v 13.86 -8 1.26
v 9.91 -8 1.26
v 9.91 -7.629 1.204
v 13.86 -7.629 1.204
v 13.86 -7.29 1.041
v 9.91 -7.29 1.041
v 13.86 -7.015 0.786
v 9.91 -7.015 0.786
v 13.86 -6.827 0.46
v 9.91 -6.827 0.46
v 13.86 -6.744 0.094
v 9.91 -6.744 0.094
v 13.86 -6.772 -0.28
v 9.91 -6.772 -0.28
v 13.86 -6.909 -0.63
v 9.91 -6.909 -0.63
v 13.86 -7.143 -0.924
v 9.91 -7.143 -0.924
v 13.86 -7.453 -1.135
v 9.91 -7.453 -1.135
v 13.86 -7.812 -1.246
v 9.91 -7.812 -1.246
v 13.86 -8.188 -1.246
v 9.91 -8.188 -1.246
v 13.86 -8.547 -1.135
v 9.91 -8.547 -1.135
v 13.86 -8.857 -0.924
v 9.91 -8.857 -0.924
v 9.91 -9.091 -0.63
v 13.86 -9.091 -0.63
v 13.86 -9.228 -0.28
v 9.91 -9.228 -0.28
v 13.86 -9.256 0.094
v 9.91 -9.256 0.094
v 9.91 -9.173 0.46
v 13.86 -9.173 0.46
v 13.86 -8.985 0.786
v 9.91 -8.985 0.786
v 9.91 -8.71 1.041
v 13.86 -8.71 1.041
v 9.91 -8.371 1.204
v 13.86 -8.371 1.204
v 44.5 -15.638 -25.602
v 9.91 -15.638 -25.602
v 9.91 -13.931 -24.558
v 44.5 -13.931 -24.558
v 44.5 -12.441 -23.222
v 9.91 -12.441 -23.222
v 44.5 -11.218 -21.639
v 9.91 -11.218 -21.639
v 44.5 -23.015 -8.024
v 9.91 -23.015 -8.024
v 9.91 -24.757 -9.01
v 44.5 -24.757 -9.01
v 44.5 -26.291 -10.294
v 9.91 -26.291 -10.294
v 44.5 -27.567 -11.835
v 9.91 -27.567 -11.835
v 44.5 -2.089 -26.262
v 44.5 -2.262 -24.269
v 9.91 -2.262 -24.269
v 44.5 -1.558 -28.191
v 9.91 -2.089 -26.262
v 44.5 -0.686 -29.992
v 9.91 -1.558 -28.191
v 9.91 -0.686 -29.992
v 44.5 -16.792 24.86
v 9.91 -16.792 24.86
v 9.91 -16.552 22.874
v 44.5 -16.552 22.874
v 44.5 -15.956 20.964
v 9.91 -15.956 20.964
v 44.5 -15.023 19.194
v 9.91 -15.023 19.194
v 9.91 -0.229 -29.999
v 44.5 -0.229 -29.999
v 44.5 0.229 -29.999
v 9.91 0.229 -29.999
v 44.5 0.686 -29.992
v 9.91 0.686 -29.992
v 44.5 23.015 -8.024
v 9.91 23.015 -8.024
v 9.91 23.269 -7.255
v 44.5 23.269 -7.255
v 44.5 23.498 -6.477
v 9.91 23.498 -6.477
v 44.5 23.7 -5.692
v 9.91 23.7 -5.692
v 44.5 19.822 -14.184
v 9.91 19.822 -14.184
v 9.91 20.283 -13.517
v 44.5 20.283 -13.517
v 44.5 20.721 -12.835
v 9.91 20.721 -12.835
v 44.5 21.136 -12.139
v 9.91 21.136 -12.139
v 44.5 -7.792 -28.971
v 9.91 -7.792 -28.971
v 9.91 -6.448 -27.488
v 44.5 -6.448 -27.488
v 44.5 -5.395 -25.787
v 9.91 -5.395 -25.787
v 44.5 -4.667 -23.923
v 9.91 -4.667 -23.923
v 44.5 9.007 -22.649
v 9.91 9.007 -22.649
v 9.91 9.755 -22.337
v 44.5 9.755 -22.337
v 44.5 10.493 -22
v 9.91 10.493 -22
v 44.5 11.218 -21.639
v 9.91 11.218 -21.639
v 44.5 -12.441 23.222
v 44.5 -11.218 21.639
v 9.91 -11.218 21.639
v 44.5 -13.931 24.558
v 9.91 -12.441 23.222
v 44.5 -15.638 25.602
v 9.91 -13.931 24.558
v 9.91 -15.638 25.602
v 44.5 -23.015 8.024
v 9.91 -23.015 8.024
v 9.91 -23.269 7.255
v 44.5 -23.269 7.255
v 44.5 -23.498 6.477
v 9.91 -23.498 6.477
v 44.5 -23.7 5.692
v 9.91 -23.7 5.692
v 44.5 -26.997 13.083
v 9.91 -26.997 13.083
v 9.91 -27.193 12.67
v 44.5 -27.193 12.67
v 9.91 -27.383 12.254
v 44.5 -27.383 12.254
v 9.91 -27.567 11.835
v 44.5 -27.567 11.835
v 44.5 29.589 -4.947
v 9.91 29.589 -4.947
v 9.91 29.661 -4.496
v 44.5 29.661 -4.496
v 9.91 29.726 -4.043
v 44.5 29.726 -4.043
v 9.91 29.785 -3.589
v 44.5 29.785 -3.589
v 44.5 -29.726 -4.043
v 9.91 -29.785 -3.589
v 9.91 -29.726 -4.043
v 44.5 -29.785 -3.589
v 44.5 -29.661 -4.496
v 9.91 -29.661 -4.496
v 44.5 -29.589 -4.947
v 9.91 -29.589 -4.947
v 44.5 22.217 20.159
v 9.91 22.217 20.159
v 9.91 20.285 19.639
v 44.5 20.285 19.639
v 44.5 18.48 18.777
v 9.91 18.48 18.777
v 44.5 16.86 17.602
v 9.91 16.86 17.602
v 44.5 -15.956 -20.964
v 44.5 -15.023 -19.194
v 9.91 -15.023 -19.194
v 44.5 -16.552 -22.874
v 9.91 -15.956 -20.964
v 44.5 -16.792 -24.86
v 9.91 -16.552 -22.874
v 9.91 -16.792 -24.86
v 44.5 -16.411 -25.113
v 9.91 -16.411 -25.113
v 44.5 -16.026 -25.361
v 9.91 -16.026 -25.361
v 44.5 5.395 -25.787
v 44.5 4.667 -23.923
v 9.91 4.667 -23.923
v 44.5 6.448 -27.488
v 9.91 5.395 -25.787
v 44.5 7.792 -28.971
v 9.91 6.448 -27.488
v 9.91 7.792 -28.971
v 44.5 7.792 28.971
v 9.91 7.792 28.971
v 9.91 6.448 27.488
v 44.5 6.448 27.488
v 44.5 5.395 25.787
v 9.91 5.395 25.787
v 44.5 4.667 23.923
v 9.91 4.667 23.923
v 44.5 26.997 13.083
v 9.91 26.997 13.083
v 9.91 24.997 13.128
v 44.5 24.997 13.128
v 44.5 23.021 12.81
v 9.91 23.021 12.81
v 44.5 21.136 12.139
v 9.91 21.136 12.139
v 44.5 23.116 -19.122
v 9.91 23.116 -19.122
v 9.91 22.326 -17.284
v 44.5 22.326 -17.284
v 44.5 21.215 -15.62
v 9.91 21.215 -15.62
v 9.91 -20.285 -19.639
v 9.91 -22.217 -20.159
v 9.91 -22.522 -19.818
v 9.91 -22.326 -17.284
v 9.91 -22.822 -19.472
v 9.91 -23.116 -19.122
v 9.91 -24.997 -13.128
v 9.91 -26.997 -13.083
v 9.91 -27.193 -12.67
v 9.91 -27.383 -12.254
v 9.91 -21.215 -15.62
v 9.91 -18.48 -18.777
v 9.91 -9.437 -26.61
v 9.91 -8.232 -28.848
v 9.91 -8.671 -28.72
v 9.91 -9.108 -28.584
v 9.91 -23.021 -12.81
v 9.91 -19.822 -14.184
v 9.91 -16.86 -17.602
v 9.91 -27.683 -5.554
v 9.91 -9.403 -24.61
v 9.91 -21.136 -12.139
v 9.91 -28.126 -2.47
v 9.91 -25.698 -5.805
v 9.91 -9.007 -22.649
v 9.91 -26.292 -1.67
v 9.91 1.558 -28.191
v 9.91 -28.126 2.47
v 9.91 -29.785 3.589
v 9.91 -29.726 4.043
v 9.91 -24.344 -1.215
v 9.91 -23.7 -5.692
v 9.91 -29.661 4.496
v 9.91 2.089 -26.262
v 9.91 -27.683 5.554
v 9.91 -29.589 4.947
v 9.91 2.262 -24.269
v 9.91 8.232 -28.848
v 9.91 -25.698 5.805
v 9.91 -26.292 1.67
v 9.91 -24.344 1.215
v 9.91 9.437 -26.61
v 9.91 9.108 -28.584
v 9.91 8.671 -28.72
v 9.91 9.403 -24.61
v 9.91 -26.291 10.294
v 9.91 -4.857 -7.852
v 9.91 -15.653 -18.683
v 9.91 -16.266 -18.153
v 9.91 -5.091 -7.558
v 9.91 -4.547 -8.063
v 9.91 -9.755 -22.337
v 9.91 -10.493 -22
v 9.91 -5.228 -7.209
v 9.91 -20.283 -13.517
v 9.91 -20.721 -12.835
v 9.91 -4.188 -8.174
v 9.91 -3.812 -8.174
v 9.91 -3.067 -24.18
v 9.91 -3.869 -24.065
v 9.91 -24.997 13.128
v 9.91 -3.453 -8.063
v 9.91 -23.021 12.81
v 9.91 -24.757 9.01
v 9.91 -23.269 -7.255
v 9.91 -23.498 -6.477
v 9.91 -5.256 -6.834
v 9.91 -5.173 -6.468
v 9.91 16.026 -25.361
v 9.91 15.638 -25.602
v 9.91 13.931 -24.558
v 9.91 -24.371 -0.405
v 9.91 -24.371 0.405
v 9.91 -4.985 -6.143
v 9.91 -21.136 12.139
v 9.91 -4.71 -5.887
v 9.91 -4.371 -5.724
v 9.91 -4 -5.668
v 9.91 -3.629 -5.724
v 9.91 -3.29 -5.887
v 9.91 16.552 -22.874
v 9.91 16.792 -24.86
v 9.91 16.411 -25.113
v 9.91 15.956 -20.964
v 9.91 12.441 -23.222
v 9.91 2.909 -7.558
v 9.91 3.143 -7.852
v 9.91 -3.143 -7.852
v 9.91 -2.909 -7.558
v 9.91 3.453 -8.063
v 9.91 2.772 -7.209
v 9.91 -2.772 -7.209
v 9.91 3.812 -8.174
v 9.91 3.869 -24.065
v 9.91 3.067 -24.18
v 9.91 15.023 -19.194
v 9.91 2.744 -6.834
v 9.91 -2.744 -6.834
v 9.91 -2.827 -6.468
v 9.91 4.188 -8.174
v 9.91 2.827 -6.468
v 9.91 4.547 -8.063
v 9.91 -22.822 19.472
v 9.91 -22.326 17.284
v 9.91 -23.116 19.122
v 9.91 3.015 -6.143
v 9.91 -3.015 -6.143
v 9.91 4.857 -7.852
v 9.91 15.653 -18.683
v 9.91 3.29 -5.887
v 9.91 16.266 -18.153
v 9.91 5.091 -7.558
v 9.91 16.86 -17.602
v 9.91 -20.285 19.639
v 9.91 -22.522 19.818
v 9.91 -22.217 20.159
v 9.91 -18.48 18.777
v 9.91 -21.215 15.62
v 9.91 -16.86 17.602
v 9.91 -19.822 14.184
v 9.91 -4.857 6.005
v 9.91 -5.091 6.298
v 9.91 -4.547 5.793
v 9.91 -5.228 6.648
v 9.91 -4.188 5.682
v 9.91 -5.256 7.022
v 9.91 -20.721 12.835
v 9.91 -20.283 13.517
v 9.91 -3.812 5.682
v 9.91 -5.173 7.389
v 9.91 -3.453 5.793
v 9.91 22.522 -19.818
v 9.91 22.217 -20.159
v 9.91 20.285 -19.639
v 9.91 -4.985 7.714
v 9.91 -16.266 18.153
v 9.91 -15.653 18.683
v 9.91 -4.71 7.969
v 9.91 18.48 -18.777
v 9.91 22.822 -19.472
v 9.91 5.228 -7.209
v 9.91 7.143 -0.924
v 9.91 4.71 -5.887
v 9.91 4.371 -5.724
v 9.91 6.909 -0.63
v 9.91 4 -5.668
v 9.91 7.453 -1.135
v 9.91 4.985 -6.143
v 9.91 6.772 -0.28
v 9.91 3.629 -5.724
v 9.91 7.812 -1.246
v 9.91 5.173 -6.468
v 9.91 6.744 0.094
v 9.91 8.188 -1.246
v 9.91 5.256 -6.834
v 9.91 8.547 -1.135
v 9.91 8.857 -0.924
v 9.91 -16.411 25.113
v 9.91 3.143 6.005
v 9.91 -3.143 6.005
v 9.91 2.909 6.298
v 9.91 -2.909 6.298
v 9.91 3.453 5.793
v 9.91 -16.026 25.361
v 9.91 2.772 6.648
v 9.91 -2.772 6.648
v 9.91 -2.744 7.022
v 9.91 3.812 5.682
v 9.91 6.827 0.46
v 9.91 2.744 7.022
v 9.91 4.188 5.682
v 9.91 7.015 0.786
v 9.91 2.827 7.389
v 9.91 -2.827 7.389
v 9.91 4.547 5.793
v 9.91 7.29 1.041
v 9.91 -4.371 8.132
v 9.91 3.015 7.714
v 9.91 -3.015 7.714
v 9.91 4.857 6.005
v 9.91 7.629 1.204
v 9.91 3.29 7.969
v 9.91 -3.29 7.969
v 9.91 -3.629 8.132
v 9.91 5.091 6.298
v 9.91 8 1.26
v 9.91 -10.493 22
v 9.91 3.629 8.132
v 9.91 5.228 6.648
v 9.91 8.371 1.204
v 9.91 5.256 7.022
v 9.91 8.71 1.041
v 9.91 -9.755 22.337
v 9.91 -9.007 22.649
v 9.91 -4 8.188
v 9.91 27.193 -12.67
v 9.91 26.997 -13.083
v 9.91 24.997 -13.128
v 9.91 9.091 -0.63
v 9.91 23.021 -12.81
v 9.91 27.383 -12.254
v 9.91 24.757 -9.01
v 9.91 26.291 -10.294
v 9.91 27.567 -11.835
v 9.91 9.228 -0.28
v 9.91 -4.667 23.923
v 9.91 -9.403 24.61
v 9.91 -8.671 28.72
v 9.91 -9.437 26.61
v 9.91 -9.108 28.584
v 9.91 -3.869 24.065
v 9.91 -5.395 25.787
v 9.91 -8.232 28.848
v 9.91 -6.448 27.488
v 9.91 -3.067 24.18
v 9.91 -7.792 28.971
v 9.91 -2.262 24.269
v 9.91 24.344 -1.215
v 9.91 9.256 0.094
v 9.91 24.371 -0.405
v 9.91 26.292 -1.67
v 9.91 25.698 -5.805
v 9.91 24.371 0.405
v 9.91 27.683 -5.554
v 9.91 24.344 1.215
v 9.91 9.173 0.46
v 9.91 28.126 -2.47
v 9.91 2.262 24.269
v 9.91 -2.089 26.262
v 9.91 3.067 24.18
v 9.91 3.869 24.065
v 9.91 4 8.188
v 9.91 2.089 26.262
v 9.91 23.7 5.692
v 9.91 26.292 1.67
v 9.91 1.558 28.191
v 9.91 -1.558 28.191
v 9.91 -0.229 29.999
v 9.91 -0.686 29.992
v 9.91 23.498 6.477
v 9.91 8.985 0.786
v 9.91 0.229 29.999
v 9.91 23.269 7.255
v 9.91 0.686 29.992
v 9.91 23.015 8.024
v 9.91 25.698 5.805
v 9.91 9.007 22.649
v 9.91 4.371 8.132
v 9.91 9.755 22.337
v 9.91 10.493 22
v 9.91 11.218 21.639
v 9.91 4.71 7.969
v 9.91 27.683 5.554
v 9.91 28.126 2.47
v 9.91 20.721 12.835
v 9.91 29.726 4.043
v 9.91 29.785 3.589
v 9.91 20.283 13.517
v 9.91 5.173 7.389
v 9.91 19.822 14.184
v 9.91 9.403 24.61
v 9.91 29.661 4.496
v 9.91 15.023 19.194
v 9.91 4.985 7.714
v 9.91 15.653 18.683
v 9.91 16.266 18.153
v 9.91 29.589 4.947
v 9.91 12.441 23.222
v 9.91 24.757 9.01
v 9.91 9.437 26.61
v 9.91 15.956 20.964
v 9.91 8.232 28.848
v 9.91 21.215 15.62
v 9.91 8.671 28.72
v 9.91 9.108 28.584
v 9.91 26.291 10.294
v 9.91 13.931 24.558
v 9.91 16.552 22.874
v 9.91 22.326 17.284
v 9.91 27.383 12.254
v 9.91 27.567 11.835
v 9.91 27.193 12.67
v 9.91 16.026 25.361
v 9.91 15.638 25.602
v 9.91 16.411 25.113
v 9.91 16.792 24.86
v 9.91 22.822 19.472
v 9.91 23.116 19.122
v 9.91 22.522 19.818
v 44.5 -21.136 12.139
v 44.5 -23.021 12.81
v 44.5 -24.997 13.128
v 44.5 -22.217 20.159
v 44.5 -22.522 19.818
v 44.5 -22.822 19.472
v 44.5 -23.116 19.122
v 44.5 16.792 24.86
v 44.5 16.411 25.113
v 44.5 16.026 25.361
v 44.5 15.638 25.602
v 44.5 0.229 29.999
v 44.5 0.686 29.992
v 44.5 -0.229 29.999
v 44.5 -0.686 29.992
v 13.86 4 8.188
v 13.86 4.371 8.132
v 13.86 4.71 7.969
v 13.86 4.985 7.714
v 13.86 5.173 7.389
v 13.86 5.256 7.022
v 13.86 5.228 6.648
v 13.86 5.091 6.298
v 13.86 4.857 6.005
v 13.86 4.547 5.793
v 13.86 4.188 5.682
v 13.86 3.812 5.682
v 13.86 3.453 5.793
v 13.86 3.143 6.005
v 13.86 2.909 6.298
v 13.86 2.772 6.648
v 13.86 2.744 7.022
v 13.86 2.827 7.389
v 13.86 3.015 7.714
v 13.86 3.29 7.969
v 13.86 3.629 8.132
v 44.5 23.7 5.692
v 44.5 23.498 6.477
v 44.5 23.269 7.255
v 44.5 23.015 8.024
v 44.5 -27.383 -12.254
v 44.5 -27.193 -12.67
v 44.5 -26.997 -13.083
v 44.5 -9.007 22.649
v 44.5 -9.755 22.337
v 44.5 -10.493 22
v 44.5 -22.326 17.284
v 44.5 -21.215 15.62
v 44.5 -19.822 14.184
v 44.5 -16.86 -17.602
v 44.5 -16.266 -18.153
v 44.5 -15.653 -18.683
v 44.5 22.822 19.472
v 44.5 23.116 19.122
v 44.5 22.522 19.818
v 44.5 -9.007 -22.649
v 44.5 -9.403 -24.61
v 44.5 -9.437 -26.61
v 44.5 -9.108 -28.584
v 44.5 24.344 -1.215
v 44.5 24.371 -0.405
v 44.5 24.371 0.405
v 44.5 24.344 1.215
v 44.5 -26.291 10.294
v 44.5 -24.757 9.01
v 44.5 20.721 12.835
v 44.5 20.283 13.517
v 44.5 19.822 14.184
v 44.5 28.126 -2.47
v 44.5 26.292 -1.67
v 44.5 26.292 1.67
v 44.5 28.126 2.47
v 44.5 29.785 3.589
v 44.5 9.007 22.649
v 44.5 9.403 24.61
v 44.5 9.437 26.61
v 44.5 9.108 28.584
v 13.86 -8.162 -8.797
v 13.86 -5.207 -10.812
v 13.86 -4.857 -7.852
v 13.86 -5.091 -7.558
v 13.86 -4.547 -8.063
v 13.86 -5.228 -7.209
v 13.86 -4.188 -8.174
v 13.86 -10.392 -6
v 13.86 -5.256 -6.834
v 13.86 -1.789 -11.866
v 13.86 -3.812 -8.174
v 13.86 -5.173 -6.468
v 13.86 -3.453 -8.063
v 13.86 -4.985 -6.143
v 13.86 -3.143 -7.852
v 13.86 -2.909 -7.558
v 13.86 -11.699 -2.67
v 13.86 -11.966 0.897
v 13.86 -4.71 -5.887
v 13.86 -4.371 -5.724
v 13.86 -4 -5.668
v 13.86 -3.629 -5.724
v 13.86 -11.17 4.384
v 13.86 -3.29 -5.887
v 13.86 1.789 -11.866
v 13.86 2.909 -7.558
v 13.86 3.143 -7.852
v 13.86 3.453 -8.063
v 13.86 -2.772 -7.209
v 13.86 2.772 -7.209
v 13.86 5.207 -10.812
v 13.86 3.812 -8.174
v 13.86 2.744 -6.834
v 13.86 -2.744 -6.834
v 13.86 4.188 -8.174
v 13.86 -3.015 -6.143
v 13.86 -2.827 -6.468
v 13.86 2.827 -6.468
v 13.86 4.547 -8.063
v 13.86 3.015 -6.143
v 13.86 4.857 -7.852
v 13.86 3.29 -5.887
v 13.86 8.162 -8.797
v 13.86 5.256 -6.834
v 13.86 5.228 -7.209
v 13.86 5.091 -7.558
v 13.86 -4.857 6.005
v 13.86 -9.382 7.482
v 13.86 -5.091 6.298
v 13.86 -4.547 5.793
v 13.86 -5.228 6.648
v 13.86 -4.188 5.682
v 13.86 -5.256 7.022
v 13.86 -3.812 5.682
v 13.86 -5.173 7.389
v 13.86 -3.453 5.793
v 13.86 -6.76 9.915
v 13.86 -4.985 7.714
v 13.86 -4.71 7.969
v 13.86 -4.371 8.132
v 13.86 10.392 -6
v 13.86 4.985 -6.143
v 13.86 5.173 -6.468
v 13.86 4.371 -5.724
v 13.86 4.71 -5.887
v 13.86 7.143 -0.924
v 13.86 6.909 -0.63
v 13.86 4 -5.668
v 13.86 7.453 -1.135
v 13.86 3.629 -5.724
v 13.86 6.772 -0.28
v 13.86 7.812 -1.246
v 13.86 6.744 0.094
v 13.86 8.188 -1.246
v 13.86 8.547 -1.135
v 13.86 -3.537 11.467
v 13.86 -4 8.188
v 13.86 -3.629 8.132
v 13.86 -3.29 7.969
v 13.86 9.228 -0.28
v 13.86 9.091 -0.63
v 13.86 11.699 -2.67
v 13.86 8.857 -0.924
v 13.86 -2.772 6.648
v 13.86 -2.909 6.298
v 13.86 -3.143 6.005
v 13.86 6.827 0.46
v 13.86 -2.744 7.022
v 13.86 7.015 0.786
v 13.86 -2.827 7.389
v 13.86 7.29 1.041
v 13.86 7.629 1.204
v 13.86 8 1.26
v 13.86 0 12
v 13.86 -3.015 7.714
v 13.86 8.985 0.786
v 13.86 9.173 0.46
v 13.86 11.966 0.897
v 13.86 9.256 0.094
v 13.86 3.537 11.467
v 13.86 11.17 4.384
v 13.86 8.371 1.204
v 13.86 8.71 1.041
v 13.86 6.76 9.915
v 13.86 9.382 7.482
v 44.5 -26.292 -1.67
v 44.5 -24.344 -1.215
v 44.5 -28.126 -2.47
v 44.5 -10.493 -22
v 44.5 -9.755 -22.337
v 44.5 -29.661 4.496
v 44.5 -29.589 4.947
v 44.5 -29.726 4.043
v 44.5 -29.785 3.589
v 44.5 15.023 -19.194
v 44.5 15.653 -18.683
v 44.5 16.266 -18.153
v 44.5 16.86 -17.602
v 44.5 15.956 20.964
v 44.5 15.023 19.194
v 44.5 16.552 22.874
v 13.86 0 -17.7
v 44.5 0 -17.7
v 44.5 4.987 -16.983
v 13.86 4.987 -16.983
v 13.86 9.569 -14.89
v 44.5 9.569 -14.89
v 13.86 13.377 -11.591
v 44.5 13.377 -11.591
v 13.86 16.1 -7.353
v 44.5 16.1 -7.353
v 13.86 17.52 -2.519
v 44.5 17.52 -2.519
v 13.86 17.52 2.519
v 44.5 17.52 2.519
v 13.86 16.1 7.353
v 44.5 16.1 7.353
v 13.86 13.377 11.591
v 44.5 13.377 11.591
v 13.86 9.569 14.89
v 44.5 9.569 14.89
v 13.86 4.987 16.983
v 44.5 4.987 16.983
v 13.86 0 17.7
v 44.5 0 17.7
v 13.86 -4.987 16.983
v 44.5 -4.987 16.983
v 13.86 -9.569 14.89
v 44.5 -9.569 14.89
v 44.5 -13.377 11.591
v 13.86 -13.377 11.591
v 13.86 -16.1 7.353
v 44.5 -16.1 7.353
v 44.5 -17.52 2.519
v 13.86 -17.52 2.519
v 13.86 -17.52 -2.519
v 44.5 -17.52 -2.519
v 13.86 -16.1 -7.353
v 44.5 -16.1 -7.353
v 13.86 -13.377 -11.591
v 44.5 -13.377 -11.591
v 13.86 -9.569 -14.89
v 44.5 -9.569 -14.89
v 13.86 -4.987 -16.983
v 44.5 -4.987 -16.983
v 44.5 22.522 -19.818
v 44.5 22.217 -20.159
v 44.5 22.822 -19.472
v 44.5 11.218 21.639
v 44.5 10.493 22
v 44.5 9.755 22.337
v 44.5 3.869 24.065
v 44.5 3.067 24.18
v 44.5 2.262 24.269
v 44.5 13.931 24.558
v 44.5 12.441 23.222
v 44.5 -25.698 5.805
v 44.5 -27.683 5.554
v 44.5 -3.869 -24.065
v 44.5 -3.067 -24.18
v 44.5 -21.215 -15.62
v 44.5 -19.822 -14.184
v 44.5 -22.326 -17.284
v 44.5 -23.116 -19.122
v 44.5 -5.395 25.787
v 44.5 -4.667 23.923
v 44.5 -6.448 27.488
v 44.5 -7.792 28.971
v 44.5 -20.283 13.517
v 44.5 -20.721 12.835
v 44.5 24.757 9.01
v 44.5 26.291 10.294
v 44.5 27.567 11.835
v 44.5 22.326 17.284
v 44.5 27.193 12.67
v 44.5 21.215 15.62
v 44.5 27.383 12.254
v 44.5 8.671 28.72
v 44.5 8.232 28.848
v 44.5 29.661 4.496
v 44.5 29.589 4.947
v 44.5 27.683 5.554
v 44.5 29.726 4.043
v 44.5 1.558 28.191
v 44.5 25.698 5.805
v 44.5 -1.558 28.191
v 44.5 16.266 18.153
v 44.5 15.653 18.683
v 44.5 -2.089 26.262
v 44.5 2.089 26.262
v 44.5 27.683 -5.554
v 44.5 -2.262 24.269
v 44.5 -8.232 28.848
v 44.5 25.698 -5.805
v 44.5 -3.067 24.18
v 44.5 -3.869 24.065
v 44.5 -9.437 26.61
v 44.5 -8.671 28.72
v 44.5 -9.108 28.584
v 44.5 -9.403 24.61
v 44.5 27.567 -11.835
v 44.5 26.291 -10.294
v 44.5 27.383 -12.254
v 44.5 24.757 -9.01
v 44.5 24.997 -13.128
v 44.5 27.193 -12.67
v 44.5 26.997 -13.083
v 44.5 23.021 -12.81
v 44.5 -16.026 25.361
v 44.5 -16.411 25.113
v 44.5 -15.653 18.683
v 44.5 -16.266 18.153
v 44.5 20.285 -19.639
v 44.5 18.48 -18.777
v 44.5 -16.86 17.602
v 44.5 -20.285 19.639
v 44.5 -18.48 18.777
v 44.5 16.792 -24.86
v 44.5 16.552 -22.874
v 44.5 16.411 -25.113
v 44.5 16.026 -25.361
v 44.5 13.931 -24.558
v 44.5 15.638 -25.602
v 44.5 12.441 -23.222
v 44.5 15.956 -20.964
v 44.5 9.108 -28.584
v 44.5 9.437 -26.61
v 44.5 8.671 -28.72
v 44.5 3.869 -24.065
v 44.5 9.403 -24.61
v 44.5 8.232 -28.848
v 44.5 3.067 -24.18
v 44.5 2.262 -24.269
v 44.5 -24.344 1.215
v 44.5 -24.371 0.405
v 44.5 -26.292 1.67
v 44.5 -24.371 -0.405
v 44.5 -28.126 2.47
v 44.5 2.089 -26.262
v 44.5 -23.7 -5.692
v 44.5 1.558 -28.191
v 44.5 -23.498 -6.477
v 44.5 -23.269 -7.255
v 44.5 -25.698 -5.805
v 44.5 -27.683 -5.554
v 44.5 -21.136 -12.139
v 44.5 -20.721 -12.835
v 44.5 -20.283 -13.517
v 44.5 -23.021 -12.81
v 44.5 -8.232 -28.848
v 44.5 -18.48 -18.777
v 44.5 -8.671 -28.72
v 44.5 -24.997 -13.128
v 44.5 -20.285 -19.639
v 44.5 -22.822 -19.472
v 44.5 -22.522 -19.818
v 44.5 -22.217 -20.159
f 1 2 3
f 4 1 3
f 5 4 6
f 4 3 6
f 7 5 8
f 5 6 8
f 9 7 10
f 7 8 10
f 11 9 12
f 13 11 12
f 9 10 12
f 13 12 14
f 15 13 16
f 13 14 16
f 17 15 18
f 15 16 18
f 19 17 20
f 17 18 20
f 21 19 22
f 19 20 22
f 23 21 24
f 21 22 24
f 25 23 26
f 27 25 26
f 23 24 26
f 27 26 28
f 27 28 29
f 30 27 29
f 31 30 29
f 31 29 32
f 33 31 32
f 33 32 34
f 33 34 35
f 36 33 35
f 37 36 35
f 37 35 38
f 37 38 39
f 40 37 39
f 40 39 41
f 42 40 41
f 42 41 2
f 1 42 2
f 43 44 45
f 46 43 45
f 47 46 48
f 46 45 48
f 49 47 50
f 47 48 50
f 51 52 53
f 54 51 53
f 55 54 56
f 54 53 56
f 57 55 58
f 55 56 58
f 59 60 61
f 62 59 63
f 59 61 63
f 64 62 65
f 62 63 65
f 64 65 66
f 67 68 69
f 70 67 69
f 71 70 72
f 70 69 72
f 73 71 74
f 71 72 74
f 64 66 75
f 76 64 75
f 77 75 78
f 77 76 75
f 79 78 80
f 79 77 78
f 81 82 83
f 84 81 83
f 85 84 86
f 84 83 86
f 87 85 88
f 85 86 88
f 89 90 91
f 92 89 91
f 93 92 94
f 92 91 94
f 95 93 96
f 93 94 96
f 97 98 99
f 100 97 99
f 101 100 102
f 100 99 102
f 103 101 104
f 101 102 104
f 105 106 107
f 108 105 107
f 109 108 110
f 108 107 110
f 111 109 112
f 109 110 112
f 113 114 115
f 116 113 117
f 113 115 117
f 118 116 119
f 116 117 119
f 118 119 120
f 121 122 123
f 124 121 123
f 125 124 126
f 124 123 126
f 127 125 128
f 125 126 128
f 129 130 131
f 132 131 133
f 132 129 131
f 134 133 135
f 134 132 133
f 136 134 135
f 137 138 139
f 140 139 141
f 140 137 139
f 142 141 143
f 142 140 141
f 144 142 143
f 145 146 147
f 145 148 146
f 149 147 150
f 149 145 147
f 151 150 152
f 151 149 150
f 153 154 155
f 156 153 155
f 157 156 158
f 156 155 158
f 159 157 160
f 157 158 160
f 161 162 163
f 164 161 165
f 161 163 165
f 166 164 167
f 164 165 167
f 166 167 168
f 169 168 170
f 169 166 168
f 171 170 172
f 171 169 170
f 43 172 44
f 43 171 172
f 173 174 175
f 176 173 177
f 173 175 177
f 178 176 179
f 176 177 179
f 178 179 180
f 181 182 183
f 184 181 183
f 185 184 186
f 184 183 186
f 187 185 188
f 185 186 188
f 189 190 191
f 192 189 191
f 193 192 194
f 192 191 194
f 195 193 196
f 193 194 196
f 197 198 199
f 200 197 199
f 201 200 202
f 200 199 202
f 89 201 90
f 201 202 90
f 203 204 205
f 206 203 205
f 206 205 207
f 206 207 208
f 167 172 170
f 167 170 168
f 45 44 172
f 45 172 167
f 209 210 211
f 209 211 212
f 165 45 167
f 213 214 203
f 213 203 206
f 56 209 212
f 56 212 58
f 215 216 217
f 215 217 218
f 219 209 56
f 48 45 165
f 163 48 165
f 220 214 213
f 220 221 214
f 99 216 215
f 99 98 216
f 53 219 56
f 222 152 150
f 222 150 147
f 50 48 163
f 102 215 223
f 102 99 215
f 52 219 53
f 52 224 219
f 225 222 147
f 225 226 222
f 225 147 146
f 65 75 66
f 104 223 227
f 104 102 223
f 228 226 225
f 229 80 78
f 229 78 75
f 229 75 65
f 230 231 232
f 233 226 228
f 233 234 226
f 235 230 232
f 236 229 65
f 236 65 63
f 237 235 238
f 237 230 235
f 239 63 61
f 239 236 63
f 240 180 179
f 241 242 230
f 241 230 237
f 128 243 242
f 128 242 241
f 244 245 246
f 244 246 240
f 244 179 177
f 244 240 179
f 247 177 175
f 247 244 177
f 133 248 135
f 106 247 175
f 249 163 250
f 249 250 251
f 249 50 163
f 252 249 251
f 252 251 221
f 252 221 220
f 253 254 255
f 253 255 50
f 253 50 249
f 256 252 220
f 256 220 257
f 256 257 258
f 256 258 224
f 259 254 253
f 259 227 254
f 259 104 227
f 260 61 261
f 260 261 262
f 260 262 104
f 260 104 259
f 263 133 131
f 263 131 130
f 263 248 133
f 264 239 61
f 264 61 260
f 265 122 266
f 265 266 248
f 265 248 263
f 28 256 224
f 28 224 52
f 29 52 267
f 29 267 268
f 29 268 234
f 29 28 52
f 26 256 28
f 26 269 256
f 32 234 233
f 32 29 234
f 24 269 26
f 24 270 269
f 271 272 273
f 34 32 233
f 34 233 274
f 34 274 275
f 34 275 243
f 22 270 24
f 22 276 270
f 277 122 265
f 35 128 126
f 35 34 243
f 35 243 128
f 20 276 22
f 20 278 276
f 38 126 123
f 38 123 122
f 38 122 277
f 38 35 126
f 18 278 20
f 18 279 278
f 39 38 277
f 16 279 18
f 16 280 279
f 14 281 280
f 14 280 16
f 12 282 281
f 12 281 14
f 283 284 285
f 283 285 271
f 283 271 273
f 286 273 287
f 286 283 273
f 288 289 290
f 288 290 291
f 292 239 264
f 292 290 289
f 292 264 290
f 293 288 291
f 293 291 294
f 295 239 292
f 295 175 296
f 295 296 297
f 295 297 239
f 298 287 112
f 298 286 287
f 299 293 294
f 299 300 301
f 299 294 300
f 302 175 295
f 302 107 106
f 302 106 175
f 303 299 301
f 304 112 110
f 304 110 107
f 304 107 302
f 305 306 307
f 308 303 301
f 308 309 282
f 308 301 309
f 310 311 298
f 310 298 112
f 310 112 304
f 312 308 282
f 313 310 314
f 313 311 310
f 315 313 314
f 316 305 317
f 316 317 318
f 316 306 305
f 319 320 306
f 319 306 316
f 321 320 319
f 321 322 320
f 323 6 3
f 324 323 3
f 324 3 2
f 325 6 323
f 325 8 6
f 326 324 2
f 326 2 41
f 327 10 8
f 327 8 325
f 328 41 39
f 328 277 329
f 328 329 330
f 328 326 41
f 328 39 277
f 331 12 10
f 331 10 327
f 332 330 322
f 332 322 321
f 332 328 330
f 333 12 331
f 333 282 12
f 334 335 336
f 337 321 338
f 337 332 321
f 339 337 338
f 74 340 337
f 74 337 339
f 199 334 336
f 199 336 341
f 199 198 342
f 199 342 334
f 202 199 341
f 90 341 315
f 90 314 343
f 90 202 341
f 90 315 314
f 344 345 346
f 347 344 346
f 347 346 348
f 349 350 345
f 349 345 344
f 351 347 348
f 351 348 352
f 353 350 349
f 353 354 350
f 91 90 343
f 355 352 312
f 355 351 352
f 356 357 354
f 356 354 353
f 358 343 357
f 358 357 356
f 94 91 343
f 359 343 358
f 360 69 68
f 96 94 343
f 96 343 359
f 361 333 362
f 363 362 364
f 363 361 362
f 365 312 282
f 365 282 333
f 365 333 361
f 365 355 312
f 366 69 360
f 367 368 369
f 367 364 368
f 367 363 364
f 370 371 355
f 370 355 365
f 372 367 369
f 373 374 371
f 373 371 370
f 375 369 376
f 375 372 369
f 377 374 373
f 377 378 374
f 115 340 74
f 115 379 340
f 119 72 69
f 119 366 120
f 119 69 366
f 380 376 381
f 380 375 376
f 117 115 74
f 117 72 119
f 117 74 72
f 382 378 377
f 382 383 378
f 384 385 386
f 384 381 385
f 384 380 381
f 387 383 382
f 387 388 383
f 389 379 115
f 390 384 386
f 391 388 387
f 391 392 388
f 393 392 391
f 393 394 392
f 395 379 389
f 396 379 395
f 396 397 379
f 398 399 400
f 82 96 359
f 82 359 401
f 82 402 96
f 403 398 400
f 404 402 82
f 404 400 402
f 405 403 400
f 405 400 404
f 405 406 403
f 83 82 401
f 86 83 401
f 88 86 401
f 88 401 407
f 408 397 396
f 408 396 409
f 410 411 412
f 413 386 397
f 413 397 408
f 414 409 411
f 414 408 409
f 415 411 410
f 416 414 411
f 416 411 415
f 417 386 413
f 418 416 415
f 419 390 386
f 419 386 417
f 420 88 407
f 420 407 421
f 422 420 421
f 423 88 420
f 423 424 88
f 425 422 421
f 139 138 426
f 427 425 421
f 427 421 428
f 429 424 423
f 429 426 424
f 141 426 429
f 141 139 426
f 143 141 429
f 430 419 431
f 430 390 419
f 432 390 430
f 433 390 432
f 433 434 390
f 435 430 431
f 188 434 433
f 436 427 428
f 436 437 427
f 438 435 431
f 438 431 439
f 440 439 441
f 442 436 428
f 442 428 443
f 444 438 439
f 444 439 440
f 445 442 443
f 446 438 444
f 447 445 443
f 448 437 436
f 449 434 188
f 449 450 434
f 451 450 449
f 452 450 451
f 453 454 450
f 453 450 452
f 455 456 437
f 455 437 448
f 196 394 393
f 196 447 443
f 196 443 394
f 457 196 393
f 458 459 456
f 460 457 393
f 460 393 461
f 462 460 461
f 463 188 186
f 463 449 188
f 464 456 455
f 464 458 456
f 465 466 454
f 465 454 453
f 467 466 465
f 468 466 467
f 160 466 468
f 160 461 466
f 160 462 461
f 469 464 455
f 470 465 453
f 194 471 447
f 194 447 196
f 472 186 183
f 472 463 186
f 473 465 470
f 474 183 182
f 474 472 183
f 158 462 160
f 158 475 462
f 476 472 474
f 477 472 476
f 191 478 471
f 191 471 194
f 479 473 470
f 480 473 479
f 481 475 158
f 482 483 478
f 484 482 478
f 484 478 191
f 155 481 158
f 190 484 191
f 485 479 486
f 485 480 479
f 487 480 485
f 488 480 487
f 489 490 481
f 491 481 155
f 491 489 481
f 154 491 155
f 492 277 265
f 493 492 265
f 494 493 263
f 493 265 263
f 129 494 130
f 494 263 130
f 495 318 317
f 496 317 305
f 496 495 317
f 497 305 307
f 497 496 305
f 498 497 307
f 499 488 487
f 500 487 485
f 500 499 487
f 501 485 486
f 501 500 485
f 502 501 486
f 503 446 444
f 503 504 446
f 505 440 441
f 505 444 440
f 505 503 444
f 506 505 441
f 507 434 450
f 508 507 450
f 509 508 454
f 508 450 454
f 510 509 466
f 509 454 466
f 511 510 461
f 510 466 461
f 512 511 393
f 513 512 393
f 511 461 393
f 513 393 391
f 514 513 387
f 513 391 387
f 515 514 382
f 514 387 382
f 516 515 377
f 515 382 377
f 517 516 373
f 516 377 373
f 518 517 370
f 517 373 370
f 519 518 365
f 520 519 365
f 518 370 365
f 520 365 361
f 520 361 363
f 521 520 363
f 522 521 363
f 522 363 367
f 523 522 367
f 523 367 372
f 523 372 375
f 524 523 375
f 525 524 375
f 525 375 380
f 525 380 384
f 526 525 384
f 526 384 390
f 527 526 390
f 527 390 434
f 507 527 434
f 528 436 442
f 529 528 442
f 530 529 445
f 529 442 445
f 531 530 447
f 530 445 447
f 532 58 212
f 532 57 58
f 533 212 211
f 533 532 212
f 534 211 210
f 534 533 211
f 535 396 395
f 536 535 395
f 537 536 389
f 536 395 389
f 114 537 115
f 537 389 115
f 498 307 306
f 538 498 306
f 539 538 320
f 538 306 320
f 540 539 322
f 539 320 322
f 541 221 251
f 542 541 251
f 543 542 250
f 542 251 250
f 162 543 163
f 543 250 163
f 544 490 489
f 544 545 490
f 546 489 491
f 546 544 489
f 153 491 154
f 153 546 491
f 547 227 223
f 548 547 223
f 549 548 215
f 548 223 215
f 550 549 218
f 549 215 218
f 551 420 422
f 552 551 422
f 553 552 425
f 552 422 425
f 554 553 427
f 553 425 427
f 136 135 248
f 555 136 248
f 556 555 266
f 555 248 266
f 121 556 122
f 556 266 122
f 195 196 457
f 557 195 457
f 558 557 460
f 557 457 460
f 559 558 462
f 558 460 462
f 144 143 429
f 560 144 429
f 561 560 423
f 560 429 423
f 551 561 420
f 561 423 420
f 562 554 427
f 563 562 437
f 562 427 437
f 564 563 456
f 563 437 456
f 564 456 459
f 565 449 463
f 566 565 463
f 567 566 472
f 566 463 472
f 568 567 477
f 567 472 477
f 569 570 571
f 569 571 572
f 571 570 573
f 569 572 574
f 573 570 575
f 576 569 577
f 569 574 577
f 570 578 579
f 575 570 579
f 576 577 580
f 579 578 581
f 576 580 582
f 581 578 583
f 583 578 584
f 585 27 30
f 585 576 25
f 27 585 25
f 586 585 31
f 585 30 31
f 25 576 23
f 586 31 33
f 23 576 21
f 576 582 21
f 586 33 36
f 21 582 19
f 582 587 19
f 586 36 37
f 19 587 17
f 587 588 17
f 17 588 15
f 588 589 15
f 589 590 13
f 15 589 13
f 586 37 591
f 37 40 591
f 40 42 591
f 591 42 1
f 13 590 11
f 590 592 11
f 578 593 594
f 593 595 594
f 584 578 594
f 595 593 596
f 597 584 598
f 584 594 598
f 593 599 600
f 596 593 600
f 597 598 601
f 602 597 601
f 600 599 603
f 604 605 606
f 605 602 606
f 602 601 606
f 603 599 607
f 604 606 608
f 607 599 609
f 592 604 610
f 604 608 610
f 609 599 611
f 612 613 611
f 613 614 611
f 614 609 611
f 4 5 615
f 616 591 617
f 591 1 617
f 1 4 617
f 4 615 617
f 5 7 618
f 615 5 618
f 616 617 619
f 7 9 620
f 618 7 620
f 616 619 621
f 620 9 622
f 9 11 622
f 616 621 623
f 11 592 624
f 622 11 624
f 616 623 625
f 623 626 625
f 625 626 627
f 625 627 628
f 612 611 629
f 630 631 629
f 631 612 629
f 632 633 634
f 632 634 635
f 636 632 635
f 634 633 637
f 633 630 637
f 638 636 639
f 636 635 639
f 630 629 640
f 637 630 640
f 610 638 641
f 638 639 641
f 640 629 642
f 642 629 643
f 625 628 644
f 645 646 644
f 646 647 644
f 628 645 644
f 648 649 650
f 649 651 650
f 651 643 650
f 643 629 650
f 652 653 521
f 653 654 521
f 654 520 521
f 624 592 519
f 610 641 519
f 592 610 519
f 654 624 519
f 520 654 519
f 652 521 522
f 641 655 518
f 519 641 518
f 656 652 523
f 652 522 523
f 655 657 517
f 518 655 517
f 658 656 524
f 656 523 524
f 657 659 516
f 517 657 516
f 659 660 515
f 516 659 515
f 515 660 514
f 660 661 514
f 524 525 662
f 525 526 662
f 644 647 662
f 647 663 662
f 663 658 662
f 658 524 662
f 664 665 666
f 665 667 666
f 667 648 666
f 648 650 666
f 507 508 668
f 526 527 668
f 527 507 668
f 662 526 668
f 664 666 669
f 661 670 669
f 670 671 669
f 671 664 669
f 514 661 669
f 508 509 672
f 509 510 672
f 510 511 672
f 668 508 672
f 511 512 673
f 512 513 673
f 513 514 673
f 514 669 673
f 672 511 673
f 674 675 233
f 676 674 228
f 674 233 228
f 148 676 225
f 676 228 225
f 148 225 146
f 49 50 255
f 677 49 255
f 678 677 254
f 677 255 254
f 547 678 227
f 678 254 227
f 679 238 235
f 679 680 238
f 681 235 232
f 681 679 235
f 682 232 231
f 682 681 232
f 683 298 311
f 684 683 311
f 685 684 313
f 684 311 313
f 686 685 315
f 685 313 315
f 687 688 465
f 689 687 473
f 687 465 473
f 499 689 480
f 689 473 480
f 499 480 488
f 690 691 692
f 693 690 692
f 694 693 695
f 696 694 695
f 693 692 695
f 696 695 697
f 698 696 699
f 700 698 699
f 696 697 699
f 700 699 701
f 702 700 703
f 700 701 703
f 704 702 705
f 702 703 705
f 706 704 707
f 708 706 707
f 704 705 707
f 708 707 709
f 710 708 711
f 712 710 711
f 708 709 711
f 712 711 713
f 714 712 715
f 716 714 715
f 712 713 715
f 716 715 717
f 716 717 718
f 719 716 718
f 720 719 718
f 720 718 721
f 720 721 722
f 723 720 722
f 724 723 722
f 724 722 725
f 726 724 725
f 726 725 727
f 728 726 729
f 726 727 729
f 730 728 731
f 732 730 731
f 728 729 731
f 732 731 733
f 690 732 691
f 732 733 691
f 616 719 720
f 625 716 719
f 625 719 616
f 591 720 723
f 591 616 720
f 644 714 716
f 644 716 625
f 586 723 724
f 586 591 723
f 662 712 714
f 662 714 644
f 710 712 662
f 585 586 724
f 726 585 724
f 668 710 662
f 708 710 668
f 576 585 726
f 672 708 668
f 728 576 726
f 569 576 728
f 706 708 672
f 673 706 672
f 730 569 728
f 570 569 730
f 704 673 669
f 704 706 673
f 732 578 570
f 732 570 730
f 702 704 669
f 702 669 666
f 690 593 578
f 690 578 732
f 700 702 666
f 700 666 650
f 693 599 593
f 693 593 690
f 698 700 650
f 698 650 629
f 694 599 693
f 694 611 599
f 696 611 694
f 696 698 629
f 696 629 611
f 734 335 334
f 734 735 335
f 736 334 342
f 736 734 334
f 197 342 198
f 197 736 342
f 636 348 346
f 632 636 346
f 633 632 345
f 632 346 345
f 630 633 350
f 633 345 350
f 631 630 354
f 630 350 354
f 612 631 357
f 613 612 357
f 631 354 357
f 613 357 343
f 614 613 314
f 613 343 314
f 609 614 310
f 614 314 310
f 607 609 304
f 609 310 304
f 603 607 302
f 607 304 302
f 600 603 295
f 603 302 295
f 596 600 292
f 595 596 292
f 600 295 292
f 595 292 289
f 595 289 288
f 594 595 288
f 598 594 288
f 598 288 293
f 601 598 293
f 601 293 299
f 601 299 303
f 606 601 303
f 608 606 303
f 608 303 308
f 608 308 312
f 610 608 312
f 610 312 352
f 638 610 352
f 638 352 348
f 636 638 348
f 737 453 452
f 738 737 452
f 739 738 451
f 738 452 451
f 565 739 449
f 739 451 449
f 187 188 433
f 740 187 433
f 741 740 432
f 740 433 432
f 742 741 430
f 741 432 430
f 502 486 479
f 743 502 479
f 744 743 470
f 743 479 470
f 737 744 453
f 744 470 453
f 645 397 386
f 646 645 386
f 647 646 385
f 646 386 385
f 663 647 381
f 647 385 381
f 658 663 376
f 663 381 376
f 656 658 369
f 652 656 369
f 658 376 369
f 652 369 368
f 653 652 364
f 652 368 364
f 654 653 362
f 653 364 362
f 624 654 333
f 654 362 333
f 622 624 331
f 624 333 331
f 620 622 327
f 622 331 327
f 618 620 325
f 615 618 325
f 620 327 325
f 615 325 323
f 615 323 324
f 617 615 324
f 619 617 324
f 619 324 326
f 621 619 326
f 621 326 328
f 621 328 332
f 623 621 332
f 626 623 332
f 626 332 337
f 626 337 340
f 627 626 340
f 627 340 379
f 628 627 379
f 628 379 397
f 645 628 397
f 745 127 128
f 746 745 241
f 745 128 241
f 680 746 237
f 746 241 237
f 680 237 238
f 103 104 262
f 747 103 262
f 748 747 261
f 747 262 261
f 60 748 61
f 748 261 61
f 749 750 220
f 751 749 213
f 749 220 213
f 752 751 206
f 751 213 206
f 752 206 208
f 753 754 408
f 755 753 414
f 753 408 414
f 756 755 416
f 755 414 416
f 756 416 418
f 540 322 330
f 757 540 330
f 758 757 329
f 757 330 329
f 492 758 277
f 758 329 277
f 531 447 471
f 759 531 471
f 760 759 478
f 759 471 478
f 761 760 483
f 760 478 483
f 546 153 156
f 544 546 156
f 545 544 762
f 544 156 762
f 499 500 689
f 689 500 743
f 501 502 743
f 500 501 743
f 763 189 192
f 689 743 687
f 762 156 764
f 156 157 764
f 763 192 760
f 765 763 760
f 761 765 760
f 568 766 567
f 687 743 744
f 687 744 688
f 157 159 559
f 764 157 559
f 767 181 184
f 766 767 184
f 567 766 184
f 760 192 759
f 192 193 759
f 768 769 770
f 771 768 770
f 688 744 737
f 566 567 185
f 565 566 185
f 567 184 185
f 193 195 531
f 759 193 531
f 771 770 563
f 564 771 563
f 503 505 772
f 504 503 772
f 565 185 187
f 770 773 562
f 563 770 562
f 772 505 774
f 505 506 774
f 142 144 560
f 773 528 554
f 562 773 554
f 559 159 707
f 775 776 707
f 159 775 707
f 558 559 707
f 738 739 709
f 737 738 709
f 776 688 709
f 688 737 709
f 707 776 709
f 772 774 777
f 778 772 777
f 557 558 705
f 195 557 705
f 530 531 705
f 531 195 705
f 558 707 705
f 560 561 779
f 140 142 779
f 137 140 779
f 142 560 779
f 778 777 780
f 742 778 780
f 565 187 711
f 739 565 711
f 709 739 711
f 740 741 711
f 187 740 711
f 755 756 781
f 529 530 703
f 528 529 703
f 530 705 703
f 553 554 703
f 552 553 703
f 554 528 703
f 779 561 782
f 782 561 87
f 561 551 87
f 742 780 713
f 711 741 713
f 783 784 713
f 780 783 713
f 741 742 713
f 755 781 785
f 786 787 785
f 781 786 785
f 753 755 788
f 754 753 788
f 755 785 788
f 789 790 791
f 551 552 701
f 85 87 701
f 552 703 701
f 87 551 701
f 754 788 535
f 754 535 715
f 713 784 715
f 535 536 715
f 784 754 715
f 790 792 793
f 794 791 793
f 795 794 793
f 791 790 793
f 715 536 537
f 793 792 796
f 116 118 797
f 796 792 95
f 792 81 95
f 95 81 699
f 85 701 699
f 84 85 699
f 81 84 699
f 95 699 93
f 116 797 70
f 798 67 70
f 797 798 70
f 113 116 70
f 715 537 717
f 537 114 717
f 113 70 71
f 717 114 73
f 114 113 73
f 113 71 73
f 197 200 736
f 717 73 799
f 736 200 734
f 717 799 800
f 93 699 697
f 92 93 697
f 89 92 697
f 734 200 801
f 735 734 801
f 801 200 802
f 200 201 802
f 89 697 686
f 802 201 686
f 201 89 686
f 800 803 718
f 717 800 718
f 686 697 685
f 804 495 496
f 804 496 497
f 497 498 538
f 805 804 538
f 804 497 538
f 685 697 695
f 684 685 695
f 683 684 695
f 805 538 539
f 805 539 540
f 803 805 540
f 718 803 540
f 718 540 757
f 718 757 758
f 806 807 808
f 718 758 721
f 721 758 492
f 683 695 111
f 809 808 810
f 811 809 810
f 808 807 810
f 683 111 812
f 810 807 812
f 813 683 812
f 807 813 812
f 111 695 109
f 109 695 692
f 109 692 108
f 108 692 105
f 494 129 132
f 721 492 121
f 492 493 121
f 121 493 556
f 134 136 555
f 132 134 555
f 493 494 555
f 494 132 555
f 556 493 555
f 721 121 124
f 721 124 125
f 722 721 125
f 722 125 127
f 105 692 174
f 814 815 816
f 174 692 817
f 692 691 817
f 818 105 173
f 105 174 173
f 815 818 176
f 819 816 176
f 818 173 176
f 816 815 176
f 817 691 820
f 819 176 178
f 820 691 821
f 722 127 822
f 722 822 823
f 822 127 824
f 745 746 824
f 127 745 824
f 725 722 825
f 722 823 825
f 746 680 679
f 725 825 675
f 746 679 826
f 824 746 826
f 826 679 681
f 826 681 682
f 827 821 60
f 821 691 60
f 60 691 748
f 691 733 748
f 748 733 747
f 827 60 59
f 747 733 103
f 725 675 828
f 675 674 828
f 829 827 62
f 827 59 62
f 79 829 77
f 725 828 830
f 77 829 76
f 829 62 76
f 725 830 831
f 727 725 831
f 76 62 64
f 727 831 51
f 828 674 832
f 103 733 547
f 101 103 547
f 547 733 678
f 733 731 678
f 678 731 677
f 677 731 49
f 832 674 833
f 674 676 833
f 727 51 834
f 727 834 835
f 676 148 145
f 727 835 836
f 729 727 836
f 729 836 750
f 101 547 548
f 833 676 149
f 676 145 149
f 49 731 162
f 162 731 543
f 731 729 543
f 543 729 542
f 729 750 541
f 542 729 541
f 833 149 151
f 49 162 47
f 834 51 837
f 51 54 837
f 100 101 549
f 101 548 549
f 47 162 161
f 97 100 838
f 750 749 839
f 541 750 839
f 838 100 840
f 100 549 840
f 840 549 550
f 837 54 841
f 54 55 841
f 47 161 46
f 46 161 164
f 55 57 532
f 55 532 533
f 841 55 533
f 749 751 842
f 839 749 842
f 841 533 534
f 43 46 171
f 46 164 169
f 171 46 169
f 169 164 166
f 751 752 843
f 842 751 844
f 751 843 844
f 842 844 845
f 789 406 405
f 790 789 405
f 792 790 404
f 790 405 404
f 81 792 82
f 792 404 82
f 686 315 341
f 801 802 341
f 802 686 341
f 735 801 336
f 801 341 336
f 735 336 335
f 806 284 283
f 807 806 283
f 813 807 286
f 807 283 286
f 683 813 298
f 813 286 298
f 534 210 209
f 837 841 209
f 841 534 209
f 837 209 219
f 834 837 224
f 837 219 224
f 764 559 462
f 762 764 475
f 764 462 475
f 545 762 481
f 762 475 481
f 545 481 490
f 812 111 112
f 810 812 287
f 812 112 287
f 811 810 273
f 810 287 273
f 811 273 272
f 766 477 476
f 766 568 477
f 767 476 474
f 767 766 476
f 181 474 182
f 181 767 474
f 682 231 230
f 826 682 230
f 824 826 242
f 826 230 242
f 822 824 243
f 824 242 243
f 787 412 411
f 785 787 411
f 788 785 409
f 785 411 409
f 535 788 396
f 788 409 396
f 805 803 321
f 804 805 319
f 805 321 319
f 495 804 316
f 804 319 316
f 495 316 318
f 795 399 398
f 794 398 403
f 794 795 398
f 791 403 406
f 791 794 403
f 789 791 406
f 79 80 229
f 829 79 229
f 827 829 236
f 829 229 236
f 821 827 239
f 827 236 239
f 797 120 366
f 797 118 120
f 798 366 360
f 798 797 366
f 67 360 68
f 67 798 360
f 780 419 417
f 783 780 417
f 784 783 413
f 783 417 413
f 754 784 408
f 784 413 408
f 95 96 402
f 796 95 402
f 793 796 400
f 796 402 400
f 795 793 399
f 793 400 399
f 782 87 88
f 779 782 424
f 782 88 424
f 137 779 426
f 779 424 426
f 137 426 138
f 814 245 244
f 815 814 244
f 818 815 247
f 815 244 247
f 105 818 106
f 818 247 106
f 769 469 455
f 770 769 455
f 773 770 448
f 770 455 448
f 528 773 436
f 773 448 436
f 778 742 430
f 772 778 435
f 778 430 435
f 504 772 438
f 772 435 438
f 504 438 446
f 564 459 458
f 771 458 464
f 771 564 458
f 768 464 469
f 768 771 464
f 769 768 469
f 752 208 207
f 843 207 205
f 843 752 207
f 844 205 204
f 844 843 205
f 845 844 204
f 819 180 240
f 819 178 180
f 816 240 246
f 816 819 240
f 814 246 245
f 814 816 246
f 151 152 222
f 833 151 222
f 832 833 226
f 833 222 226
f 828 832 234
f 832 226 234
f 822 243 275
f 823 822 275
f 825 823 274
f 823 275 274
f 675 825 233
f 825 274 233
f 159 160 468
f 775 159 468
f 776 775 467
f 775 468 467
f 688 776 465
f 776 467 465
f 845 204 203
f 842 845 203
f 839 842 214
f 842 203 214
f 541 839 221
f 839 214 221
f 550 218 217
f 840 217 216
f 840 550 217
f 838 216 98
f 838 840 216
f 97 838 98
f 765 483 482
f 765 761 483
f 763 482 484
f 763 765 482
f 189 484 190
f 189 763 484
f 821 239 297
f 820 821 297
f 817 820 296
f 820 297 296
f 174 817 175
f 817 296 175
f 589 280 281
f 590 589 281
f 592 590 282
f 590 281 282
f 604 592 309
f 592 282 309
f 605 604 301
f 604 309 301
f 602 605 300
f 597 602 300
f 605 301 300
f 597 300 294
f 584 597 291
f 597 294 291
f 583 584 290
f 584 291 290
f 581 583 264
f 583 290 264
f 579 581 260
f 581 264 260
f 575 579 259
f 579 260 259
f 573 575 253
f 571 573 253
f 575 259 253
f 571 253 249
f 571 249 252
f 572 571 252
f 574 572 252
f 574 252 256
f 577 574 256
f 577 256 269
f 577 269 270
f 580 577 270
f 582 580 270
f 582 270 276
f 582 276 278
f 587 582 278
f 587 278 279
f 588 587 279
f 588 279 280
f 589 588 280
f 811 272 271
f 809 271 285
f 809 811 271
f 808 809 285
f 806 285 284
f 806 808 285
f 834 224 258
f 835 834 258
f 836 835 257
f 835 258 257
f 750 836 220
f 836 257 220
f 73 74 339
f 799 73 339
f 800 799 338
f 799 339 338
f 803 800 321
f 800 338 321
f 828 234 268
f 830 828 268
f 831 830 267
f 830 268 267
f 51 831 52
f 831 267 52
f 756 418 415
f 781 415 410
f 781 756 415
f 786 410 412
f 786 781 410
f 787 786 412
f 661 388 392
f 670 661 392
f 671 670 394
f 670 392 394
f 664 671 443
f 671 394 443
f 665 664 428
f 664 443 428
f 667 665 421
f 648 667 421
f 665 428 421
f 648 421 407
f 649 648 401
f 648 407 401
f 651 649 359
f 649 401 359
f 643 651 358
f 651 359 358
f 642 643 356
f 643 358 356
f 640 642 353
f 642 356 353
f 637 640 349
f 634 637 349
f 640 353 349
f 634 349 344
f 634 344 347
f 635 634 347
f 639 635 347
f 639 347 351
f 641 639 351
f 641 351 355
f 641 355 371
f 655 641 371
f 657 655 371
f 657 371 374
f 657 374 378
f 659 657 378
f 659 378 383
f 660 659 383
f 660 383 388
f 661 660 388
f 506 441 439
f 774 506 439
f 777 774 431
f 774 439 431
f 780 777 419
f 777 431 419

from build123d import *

# Parameters (mm, degrees)
BASPROSKE_W         = 44.5
BASPROSKE_H         = 30
TOOTHCUT_DEPTH      = 62.483737687
TEETHCUTS_COUNT     = 22
TEETHCUTS_ANGLE     = 343.636363636
HUBNEAONESKE_R      = 21
HUBNEARONE_DEPTH    = 5.5000508
BORSKE_R            = 12
BORE_DEPTH          = 50.0000508
CUT_EXTRUDE1_START  = -15.41
SKETCH1_R           = 30
CUT_EXTRUDE1_DEPTH  = 15.41
BOSS_EXTRUDE1_START = -3.95
SKETCH2_R           = 12
BOSS_EXTRUDE1_DEPTH = 3.95
SKETCH3_R           = 1.26
CUT_EXTRUDE2_DEPTH  = 55.622234789
SKETCH4_R           = 17.7
CUT_EXTRUDE3_DEPTH  = 30.64


with BuildPart() as part:
    # BasProSke → Base-Revolve (revolve)
    with BuildSketch(Plane(origin=(0, 0, 0), x_dir=(1, 0, 0), z_dir=(0, 1, 0)), mode=Mode.PRIVATE) as base_revolve_sk:
        with Locations((22.25, 15)):
            Rectangle(BASPROSKE_W, BASPROSKE_H)
    revolve(base_revolve_sk.sketch.rotate(Axis((-10, 0, 0), (1, 0, 0)), 180), axis=Axis((-10, 0, 0), (1, 0, 0)))

    # TooCutSke → ToothCut (cut, through all)
    with BuildSketch(Plane(origin=(0, 0, 0), x_dir=(0, 0, -1), z_dir=(1, 0, 0))):
        with BuildLine():
            ThreePointArc((1.215293185, 24.343683749), (0, 24.374), (-1.215293185, 24.343683749))
            ThreePointArc((-1.215293185, 24.343683749), (-2.034367134, 27.241050063), (-3.608361155, 29.807790507))
            ThreePointArc((-3.608361155, 29.807790507), (0, 30.0254), (3.608361155, 29.807790507))
            ThreePointArc((3.608361155, 29.807790507), (2.034367134, 27.241050063), (1.215293185, 24.343683749))
        make_face()
    toothcut = extrude(amount=TOOTHCUT_DEPTH, mode=Mode.SUBTRACT)

    # TeethCuts: ToothCut ×22 about axis
    teethcuts_axis = Axis((-10, 0, 0), (1, 0, 0))
    for i in range(1, TEETHCUTS_COUNT):
        add(toothcut.rotate(teethcuts_axis, i * TEETHCUTS_ANGLE / (TEETHCUTS_COUNT - 1)), mode=Mode.SUBTRACT)

    # HubNeaOneSke → HubNearOne (add)
    with BuildSketch(Plane.ZY):
        with Locations(Location((0, 0, 0), (0, 0, 180))):
            Circle(HUBNEAONESKE_R)
    extrude(amount=HUBNEARONE_DEPTH)

    # BorSke → Bore (cut, symmetric)
    with BuildSketch(Plane(origin=(0, 0, 0), x_dir=(0, 0, -1), z_dir=(1, 0, 0))):
        with Locations(Location((0, 0, 0), (0, 0, 180))):
            Circle(BORSKE_R)
    extrude(amount=BORE_DEPTH, both=True, mode=Mode.SUBTRACT)

    # Sketch1 → Cut-Extrude1 (cut)
    with BuildSketch(Plane.ZY.offset(5.5000508).offset(CUT_EXTRUDE1_START)):
        Circle(SKETCH1_R)
    extrude(amount=CUT_EXTRUDE1_DEPTH, mode=Mode.SUBTRACT)

    # Sketch2 → Boss-Extrude1 (add)
    with BuildSketch(Plane.ZY.offset(-9.9099492).offset(BOSS_EXTRUDE1_START)):
        Circle(SKETCH2_R)
    extrude(amount=BOSS_EXTRUDE1_DEPTH)

    # Sketch3 → Cut-Extrude2 (cut, through all)
    with BuildSketch(Plane.ZY.offset(-9.9099492)):
        with Locations((0, 8)):
            Circle(SKETCH3_R)
        with Locations((6.92820323, 4)):
            Circle(SKETCH3_R)
        with Locations((6.92820323, -4)):
            Circle(SKETCH3_R)
        with Locations((0, -8)):
            Circle(SKETCH3_R)
        with Locations((-6.92820323, -4)):
            Circle(SKETCH3_R)
        with Locations((-6.92820323, 4)):
            Circle(SKETCH3_R)
    extrude(amount=-CUT_EXTRUDE2_DEPTH, mode=Mode.SUBTRACT)

    # Sketch4 → Cut-Extrude3 (cut)
    with BuildSketch(Plane(origin=(44.5, 0, 0), x_dir=(0, 0, -1), z_dir=(1, 0, 0))):
        Circle(SKETCH4_R)
    extrude(amount=-CUT_EXTRUDE3_DEPTH, mode=Mode.SUBTRACT)


solid = part.part
